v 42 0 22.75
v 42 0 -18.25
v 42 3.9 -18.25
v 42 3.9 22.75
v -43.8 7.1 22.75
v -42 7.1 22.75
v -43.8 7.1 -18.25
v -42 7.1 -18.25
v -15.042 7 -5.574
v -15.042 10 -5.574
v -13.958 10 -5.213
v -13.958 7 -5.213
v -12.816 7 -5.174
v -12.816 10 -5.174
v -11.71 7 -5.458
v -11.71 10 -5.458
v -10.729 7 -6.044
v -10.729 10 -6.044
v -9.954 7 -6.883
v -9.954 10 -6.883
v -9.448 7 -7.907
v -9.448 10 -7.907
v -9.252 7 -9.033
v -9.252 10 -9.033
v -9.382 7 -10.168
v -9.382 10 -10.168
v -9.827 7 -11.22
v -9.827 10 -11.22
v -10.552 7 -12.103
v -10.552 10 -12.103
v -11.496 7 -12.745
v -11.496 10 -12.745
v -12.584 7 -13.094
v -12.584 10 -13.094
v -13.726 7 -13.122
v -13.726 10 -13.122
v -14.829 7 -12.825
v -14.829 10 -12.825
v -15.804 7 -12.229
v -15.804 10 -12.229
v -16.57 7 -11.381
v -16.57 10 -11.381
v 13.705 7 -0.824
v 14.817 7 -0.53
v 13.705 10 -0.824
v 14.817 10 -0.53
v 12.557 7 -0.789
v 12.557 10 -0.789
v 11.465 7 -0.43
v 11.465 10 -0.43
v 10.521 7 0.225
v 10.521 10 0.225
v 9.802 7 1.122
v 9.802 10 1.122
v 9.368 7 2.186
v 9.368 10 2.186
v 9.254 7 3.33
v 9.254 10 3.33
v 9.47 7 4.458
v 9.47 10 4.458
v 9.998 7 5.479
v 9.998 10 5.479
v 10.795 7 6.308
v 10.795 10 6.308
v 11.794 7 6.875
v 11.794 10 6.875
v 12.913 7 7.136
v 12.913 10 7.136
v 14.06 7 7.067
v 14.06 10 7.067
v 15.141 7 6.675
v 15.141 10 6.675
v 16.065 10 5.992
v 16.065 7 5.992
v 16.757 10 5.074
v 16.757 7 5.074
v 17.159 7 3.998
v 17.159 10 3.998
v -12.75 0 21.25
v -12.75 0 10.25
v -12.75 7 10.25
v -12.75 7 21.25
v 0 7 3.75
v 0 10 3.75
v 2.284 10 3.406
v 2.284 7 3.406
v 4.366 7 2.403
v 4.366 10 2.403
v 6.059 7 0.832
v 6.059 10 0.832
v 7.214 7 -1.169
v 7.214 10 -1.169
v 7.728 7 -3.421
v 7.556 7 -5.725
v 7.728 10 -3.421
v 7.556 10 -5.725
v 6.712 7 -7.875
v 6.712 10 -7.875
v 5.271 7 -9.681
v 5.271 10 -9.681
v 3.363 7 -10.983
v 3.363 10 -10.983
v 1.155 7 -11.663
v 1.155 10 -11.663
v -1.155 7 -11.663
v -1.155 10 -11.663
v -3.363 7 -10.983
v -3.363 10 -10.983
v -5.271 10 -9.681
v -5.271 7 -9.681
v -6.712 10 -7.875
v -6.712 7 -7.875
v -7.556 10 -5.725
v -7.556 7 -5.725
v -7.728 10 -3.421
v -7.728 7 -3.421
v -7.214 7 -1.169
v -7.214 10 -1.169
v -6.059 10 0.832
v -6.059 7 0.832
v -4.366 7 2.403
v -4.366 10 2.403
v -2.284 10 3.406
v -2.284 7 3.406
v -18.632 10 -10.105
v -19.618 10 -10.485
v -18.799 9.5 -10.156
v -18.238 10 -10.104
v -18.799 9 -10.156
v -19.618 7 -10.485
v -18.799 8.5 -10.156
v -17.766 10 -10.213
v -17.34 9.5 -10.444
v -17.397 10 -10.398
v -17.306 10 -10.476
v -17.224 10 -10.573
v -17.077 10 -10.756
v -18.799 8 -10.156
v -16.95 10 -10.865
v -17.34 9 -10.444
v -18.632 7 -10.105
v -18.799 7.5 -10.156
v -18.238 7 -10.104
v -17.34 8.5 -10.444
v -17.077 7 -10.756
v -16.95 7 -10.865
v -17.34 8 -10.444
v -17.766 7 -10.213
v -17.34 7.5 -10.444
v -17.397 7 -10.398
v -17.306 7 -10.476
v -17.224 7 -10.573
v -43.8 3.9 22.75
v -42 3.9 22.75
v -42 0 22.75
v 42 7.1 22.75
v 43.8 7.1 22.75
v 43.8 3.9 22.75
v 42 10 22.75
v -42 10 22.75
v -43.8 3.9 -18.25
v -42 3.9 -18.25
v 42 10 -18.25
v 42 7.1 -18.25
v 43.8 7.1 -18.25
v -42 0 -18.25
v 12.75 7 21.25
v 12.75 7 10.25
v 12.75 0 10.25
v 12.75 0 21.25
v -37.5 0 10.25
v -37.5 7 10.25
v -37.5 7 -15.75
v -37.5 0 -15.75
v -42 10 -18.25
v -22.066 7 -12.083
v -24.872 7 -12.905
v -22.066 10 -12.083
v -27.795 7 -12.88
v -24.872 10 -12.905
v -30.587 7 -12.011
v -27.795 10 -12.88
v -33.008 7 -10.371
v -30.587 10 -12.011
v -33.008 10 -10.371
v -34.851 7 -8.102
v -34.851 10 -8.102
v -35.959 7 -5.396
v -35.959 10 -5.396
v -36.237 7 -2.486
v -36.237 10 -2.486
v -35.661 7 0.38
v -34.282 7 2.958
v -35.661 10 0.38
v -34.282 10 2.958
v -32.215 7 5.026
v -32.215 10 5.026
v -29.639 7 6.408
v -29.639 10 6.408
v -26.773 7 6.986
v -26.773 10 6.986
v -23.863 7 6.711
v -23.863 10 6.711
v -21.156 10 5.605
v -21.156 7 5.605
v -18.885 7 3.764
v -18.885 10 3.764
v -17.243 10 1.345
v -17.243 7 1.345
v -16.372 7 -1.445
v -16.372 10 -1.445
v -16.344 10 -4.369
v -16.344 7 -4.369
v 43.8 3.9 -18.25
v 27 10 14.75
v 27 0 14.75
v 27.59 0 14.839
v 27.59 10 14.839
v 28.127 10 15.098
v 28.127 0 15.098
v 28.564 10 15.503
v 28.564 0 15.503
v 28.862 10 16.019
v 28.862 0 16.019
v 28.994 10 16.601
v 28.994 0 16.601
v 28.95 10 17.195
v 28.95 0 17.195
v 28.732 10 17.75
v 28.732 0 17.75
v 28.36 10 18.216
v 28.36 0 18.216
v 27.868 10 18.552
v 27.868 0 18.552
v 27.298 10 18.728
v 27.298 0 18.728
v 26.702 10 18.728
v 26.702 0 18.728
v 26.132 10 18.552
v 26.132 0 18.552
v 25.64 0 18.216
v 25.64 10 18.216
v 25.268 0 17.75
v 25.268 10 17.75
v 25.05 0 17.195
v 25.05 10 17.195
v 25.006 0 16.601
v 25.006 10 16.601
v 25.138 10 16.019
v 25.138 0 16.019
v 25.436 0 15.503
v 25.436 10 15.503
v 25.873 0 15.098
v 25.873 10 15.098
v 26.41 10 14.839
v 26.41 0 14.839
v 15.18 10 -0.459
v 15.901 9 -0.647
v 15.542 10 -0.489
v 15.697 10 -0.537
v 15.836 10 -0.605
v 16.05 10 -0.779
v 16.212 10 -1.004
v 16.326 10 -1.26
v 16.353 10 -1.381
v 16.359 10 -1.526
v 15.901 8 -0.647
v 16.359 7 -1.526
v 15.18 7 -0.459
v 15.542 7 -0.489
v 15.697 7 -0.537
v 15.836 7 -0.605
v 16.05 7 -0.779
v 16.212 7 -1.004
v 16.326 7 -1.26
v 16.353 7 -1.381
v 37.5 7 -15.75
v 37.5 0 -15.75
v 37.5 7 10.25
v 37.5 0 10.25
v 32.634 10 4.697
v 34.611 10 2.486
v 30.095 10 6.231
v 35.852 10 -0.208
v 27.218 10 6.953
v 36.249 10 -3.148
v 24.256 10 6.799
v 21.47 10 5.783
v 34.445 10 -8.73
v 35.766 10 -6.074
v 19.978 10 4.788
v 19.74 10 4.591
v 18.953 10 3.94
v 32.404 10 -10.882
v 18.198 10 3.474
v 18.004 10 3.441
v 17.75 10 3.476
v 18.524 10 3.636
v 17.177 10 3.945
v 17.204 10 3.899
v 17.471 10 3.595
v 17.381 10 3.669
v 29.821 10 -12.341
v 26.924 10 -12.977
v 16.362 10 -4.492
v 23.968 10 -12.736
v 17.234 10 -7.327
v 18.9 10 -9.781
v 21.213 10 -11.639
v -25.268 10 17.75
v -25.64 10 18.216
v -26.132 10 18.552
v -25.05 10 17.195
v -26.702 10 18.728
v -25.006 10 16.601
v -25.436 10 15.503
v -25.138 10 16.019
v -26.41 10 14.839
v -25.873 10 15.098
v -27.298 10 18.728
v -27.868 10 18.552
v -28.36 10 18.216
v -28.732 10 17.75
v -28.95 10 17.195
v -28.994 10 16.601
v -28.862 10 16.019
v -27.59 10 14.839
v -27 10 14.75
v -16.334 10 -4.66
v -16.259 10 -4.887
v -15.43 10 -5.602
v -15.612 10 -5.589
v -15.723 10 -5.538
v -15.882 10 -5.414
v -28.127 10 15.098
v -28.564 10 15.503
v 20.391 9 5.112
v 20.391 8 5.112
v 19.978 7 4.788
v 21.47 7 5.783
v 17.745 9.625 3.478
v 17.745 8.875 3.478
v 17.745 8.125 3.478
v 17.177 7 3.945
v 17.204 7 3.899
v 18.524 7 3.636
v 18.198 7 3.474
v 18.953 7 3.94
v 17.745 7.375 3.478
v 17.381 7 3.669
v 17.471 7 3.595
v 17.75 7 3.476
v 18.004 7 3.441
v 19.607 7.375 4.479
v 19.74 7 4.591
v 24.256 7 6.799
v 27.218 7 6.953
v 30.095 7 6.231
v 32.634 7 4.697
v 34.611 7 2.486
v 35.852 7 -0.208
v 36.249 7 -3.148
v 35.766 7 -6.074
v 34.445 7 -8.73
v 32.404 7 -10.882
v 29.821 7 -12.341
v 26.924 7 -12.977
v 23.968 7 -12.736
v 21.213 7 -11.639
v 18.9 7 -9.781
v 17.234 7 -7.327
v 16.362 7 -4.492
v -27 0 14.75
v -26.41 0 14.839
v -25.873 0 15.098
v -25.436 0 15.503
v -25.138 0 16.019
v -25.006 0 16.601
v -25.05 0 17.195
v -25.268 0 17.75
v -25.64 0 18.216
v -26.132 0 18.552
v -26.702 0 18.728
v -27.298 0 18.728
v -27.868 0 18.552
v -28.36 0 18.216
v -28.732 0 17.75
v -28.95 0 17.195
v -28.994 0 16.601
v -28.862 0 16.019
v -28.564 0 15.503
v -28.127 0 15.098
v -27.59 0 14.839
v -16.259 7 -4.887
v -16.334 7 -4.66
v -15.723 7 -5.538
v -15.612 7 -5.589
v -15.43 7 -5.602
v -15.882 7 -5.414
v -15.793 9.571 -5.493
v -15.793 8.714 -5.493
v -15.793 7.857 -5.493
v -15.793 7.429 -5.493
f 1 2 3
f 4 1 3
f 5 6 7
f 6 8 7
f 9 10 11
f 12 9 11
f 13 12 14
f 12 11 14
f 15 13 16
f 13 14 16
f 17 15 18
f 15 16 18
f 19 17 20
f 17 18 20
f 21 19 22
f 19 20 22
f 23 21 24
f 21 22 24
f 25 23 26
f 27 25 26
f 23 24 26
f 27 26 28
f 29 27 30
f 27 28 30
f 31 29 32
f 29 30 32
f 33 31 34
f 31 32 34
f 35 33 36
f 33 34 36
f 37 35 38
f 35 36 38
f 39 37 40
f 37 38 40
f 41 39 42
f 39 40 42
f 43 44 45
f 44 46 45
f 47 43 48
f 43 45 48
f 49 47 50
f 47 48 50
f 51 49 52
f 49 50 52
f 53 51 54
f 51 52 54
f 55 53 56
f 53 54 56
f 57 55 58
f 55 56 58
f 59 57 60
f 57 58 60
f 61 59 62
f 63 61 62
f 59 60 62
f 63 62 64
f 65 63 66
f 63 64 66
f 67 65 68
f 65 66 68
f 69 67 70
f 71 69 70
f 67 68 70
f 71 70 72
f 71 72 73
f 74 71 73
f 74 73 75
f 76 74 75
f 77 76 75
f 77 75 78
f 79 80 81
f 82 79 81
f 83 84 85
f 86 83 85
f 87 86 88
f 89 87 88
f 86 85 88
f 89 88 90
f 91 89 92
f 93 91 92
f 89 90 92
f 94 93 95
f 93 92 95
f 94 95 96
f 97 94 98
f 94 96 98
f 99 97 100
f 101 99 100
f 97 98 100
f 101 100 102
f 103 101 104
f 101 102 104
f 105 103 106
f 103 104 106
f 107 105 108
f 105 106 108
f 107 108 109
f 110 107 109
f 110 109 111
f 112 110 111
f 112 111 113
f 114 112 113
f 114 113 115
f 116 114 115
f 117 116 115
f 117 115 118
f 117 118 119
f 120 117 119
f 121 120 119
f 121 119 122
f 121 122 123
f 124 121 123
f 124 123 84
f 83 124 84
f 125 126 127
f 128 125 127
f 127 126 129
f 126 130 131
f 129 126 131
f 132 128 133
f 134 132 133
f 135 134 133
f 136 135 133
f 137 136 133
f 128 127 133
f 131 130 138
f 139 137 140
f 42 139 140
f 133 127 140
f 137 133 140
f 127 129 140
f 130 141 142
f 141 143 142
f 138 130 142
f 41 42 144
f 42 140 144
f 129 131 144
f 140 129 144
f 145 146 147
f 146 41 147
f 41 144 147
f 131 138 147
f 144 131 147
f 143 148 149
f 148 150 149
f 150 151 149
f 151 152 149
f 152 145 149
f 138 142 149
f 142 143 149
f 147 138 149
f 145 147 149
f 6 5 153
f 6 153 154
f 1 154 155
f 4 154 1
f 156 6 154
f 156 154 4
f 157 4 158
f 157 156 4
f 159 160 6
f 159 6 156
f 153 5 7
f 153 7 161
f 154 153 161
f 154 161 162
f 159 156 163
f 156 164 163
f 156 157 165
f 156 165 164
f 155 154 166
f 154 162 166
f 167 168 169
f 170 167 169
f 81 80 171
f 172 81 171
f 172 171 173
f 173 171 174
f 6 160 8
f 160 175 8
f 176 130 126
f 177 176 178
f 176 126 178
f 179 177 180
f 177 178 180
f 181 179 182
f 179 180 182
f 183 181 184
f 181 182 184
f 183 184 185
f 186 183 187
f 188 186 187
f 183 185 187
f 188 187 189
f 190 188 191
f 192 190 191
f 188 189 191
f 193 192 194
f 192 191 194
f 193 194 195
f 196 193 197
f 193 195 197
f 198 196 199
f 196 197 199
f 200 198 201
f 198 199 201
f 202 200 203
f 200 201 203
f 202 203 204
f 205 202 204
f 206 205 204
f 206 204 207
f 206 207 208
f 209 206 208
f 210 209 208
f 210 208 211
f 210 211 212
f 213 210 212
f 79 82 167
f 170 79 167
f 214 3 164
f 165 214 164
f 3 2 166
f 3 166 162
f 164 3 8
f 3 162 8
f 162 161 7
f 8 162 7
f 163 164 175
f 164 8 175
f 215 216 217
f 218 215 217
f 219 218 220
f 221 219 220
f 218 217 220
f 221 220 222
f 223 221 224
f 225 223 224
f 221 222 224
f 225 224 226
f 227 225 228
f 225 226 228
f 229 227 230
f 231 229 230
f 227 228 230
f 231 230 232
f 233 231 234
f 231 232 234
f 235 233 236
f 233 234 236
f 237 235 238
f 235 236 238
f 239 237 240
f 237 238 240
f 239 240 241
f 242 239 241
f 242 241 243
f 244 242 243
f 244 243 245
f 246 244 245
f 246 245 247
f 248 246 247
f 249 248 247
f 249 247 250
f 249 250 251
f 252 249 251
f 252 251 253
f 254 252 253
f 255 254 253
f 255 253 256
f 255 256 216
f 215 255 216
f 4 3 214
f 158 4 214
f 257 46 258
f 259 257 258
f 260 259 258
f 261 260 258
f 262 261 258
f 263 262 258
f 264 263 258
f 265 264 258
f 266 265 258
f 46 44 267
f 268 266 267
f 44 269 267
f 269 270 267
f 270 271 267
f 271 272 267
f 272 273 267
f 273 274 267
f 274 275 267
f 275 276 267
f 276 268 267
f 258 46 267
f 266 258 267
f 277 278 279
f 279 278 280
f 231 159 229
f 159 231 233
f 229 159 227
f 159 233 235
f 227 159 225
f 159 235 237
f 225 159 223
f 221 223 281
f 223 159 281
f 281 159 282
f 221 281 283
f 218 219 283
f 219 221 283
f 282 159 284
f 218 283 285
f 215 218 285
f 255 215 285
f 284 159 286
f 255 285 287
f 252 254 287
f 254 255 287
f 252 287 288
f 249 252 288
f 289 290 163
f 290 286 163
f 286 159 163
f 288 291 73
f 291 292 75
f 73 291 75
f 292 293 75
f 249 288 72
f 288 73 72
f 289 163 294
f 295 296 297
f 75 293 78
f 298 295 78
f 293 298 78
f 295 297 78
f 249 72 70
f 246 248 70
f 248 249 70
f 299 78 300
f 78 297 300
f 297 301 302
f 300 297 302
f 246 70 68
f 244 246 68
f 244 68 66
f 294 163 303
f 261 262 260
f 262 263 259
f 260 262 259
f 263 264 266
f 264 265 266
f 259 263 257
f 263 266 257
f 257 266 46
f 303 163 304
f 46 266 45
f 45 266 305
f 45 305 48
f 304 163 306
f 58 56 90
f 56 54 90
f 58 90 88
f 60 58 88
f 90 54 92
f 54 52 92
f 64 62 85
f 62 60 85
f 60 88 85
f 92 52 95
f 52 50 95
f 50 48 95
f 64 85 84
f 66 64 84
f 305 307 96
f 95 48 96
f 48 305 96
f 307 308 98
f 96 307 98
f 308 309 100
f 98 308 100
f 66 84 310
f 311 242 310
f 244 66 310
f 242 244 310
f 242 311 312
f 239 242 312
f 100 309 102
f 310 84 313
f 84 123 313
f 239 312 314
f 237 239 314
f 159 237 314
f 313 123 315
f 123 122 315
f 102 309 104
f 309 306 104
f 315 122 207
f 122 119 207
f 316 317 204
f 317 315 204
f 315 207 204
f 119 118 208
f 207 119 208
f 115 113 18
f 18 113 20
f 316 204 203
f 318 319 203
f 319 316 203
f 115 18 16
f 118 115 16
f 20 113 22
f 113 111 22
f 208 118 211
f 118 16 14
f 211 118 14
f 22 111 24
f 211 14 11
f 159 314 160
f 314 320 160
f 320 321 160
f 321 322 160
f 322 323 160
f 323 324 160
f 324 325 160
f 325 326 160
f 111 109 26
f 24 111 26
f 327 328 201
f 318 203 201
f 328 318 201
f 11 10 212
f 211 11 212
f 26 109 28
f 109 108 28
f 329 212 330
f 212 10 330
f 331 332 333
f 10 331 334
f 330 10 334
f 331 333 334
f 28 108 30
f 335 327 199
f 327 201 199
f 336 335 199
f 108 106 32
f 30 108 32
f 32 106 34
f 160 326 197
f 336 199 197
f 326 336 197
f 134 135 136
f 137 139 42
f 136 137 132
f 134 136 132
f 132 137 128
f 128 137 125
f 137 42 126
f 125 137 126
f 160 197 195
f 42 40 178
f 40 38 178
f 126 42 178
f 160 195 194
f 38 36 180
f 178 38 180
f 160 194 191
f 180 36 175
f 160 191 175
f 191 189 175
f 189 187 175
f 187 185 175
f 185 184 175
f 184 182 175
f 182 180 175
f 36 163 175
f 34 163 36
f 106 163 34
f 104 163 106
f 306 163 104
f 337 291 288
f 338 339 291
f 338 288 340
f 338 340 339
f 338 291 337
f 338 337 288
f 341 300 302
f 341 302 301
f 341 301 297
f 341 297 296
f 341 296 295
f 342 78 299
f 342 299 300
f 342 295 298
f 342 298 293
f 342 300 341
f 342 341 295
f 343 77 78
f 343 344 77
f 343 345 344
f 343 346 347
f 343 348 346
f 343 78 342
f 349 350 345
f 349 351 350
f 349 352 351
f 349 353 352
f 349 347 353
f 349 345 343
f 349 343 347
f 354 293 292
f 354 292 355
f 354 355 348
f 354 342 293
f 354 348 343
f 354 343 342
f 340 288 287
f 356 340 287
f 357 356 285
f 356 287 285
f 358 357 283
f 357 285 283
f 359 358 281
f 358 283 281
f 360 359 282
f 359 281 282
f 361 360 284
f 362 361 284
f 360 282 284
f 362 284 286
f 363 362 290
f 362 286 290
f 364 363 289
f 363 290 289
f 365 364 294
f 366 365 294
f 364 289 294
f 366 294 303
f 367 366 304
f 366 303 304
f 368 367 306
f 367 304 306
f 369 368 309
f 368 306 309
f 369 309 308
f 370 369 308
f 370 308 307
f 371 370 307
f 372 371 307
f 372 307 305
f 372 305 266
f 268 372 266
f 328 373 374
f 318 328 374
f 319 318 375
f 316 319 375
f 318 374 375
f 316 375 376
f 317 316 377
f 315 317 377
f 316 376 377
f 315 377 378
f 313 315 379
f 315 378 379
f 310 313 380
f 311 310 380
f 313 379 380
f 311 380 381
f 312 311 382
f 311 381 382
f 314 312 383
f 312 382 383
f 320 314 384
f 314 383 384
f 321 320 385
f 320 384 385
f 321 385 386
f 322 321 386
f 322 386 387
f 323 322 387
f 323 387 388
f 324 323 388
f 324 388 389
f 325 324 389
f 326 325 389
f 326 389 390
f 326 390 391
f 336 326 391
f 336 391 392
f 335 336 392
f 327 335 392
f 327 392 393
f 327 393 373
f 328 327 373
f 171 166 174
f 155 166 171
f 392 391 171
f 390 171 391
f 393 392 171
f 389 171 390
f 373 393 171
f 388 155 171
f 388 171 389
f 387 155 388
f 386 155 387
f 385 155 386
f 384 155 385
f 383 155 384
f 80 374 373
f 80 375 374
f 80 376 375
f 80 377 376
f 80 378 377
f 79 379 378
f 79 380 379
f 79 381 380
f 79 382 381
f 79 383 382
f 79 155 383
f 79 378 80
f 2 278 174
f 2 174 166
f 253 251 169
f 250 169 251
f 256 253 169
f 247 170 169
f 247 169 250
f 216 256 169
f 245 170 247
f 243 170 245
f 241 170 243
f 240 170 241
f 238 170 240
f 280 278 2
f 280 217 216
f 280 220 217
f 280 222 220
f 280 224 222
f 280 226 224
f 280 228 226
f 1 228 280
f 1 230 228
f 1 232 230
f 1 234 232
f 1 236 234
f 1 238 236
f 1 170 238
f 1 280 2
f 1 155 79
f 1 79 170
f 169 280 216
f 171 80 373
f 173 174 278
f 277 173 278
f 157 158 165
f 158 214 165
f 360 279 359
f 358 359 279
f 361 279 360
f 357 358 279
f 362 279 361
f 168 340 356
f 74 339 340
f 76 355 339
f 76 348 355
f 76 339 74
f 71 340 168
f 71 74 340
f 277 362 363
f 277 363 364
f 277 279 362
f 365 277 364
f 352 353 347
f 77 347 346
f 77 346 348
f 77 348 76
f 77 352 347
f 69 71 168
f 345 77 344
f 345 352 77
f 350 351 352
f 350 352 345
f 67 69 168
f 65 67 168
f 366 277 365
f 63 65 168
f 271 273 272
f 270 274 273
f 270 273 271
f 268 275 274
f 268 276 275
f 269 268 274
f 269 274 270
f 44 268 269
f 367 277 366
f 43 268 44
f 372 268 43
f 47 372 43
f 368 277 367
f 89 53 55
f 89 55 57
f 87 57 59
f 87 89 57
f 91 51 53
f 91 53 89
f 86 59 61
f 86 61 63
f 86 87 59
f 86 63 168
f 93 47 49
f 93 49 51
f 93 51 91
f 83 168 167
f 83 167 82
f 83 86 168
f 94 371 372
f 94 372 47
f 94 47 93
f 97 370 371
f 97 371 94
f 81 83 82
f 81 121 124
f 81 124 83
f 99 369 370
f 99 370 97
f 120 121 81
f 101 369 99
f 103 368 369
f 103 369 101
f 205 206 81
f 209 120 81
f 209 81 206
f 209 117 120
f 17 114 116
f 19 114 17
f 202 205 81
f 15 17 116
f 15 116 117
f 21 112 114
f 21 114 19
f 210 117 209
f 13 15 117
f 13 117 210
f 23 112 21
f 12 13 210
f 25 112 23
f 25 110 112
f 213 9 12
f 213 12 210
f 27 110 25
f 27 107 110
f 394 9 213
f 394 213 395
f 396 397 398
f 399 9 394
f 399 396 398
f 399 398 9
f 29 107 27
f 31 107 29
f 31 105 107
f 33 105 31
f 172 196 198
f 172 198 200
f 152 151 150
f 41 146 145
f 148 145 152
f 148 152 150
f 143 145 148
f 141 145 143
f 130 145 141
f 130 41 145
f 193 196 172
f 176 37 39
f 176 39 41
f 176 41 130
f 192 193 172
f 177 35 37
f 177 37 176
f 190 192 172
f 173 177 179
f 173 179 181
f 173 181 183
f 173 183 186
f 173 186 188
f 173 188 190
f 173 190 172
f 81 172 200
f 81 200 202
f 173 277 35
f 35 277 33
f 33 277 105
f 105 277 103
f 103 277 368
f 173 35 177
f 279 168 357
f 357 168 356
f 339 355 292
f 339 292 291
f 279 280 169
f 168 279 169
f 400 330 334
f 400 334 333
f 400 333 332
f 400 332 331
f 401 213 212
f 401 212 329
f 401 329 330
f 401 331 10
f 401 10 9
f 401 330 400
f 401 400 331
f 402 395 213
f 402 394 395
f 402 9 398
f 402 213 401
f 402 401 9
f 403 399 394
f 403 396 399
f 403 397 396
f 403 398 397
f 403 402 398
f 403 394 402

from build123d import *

# Parameters (mm, degrees)
SKETCH1_W                   = 75
SKETCH1_H                   = 26.5
BASE_01_DEPTH               = 10
SKETCH4_R                   = 7.75
SKETCH4_R_2                 = 10
SKETCH4_R_3                 = 4
CAMERA_LIGHTS_DEPTH         = 42.00990734
SKETCH5_W                   = 75
SKETCH5_H                   = 10
UPPER_SIDE_SUPPORT_DEPTH    = 5
SKETCH6_W                   = 31.5
SKETCH6_H                   = 10
LEFT_SIDE_SUPPORT_DEPTH     = 4.5
SKETCH7_W                   = 31.5
SKETCH7_H                   = 10
RIGHT_SIDE_SUPPORT_DEPTH    = 4.5
SKETCH8_W                   = 75
SKETCH8_H                   = 2.5
BASE_01_CUT_DEPTH           = 7
SKETCH10_W                  = 31.5
SKETCH10_H                  = 3.2
LEFT_SIDE_BODY_HOLDER_DEPTH = 1.8
LOWER_BASE_SUPPORT_DEPTH    = 9.5
SKETCH12_W                  = 25.5
SKETCH12_H                  = 7
CAMERA_WIRE_EXT_CUT_DEPTH   = 1.5
SKETCH13_R                  = 2
CAMERA_HOLDING_HOLES_DEPTH  = 51.35873807
IR_START                    = -3
IR_FIT_CUT_DEPTH            = 3
IR_FIT_CUT_2_DEPTH          = 3


# Read off the part's stored shape, not the designer's step: IR Fit Cut
with BuildPart() as part:
    # Sketch1 → Base 01 (new body)
    with BuildSketch(Plane(origin=(0, 0, 0), x_dir=(1, 0, 0), z_dir=(0, 1, 0))):
        Rectangle(SKETCH1_W, SKETCH1_H)
    extrude(amount=BASE_01_DEPTH)

    # Sketch4 → Camera & lights (cut, through all)
    with BuildSketch(Plane(origin=(0, 10, 0), x_dir=(1, 0, 0), z_dir=(0, 1, 0))):
        with Locations(Location((0, 4, 0), (0, 0, 270))):
            Circle(SKETCH4_R)
        with Locations(Location((-26.25, 3, 0), (0, 0, 270))):
            Circle(SKETCH4_R_2)
        with Locations(Location((26.25, 3, 0), (0, 0, 90))):
            Circle(SKETCH4_R_2)
        with Locations(Location((-13.25, 9.15, 0), (0, 0, 270))):
            Circle(SKETCH4_R_3)
        with Locations(Location((13.25, -3.15, 0), (0, 0, 270))):
            Circle(SKETCH4_R_3)
    extrude(amount=-CAMERA_LIGHTS_DEPTH, mode=Mode.SUBTRACT)

    # Sketch5 → Upper side support (add)
    with BuildSketch(Plane(origin=(0, 0, -13.25), x_dir=(-1, 0, 0), z_dir=(0, 0, -1))):
        with Locations((0, 5)):
            Rectangle(SKETCH5_W, SKETCH5_H)
    extrude(amount=UPPER_SIDE_SUPPORT_DEPTH)

    # Sketch6 → Left Side Support (add)
    with BuildSketch(Plane.ZY.offset(37.5)):
        with Locations((-2.5, 5)):
            Rectangle(SKETCH6_W, SKETCH6_H)
    extrude(amount=LEFT_SIDE_SUPPORT_DEPTH)

    # Sketch7 → Right Side Support (add)
    with BuildSketch(Plane(origin=(37.5, 0, 0), x_dir=(0, 0, -1), z_dir=(1, 0, 0))):
        with Locations((2.5, 5)):
            Rectangle(SKETCH7_W, SKETCH7_H)
    extrude(amount=RIGHT_SIDE_SUPPORT_DEPTH)

    # Sketch8 → Base 01 Cut (cut)
    with BuildSketch(Plane.XZ):
        with Locations((0, -14.5)):
            Rectangle(SKETCH8_W, SKETCH8_H)
        Polygon((-37.5, 10.25), (-37.5, -13.25), (37.5, -13.25), (37.5, 10.25), (12.75, 10.25), (12.75, 13.25), (-12.75, 13.25), (-12.75, 10.25), align=None)
    extrude(amount=-BASE_01_CUT_DEPTH, mode=Mode.SUBTRACT)

    # Sketch10 → Left Side body Holder (add)
    with BuildSketch(Plane.ZY.offset(42)):
        with Locations((-2.5, 5.5)):
            Rectangle(SKETCH10_W, SKETCH10_H)
    left_side_body_holder = extrude(amount=LEFT_SIDE_BODY_HOLDER_DEPTH)

    # Right Side body Holder: Left Side body Holder across plane
    add(left_side_body_holder.mirror(Plane(origin=(0, 0, 0), x_dir=(0, 0, 1), z_dir=(1, 0, 0))))

    # Sketch11 → Lower base support (add)
    with BuildSketch(Plane.XY.offset(13.25)):
        Polygon((42, 3.9), (43.8, 3.9), (43.8, 7.1), (42, 7.1), (42, 10), (-42, 10), (-42, 7.1), (-43.8, 7.1), (-43.8, 3.9), (-42, 3.9), (-42, 0), (-12.75, 0), (-12.75, 7), (12.75, 7), (12.75, 0), (42, 0), align=None)
    extrude(amount=LOWER_BASE_SUPPORT_DEPTH)

    # Sketch12 → Camera Wire Ext cut (add)
    with BuildSketch(Plane.XY.offset(22.75)):
        with Locations((0, 3.5)):
            Rectangle(SKETCH12_W, SKETCH12_H)
    extrude(amount=-CAMERA_WIRE_EXT_CUT_DEPTH)

    # Sketch13 → Camera Holding Holes (cut, through all)
    with BuildSketch(Plane.XZ):
        with Locations(Location((27, 16.75, 0), (0, 0, 270))):
            Circle(SKETCH13_R)
        with Locations(Location((-27, 16.75, 0), (0, 0, 270))):
            Circle(SKETCH13_R)
    extrude(amount=-CAMERA_HOLDING_HOLES_DEPTH, mode=Mode.SUBTRACT)

    # IR Fit Cut outline → IR Fit Cut (cut)
    with BuildSketch(Plane(origin=(0, 10, 0), x_dir=(1, 0, 0), z_dir=(0, 1, 0)).offset(IR_START)):
        with BuildLine():
            ThreePointArc((14.81661521, 0.530450623), (16.802776188, -1.31212586), (17.159118071, -3.99781832))
            add(Edge.make_bspline(
                [(17.159118071, -3.99781832), (17.166278119, -3.969934013), (17.178337476, -3.936891555), (17.246780801, -3.833932894), (17.305076574, -3.770665125), (17.4349321, -3.591329111), (17.910202533, -3.389398307), (18.485343295, -3.51410072), (19.253649785, -4.184734467), (19.696093453, -4.554177367), (19.740193994, -4.590943668)],
                knots=[0.275674193, 0.275674193, 0.275674193, 0.275674193, 0.290109149, 0.298316137, 0.344073007, 0.355594369, 0.407810154, 0.509906244, 0.719358573, 0.742631054, 0.742631054, 0.742631054, 0.742631054], degree=3))
            ThreePointArc((19.740193994, -4.590943668), (17.497995952, -1.83760531), (16.359278951, 1.525674007))
            add(Edge.make_bspline(
                [(14.81661521, 0.530450623), (15.181815782, 0.40272852), (15.86245956, 0.462037657), (16.265810628, 1.050757555), (16.365277346, 1.362969111), (16.359278951, 1.525674007)],
                knots=[0.222395894, 0.222395894, 0.222395894, 0.222395894, 0.382891887, 0.477494733, 0.530327084, 0.530327084, 0.530327084, 0.530327084], degree=3))
        make_face()
        with BuildLine():
            ThreePointArc((21.469612645, -5.783387543), (20.701388337, -5.319429584), (19.977853966, -4.788464812))
            add(Edge.make_bspline(
                [(19.977853966, -4.788464812), (20.110594541, -4.897809063), (20.298403446, -5.048291915), (20.760469103, -5.372959062), (21.111213366, -5.596213213), (21.469612645, -5.783387543)],
                knots=[0.784128545, 0.784128545, 0.784128545, 0.784128545, 0.852708708, 0.878445602, 1, 1, 1, 1], degree=3))
        make_face()
        with BuildLine():
            ThreePointArc((-19.618250253, 10.484643966), (-17.433842543, 7.71967877), (-16.344107974, 4.368686656))
            add(Edge.make_bspline(
                [(-16.344107974, 4.368686656), (-16.346786074, 4.400652489), (-16.363410494, 4.682682191), (-16.259037035, 4.912025365), (-16.023124853, 5.263934466), (-15.852731431, 5.462556558), (-15.60349989, 5.608912133), (-15.554028579, 5.614463051), (-15.094185027, 5.582253589), (-15.041983124, 5.573857318)],
                knots=[0.560427253, 0.560427253, 0.560427253, 0.560427253, 0.567434759, 0.623494809, 0.639172793, 0.708536611, 0.730178495, 0.833949751, 0.846921158, 0.846921158, 0.846921158, 0.846921158], degree=3))
            ThreePointArc((-15.041983124, 5.573857318), (-17.118345184, 8.132205554), (-16.569932259, 11.381154364))
            add(Edge.make_bspline(
                [(-19.618250253, 10.484643966), (-19.339728391, 10.325698426), (-18.991295195, 10.23044062), (-18.442190237, 10.020965988), (-17.459671267, 10.214555154), (-16.971941729, 10.950254946), (-17.098342068, 10.607973515), (-16.595700977, 11.343869746), (-16.569932259, 11.381154364)],
                knots=[0.533161585, 0.533161585, 0.533161585, 0.533161585, 0.632900245, 0.655820771, 0.750528398, 0.776212567, 0.886978295, 0.892604255, 0.892604255, 0.892604255, 0.892604255], degree=3))
        make_face()
    extrude(amount=IR_FIT_CUT_DEPTH, mode=Mode.SUBTRACT)

    # IR Fit Cut 2 outline → IR Fit Cut 2 (add)
    with BuildSketch(Plane(origin=(0, 10, 0), x_dir=(1, 0, 0), z_dir=(0, 1, 0)).offset(IR_START)):
        with BuildLine():
            add(Edge.make_bspline(
                [(19.740193994, -4.590943668), (19.76337103, -4.610266194), (19.841872549, -4.675657908), (19.921206817, -4.741802064), (19.977853966, -4.788464812)],
                knots=[0.742631054, 0.742631054, 0.742631054, 0.742631054, 0.754861905, 0.784128545, 0.784128545, 0.784128545, 0.784128545], degree=3))
            ThreePointArc((19.740193994, -4.590943668), (19.858260946, -4.690622333), (19.977853966, -4.788464812))
        make_face()
    extrude(amount=IR_FIT_CUT_2_DEPTH)


solid = part.part
